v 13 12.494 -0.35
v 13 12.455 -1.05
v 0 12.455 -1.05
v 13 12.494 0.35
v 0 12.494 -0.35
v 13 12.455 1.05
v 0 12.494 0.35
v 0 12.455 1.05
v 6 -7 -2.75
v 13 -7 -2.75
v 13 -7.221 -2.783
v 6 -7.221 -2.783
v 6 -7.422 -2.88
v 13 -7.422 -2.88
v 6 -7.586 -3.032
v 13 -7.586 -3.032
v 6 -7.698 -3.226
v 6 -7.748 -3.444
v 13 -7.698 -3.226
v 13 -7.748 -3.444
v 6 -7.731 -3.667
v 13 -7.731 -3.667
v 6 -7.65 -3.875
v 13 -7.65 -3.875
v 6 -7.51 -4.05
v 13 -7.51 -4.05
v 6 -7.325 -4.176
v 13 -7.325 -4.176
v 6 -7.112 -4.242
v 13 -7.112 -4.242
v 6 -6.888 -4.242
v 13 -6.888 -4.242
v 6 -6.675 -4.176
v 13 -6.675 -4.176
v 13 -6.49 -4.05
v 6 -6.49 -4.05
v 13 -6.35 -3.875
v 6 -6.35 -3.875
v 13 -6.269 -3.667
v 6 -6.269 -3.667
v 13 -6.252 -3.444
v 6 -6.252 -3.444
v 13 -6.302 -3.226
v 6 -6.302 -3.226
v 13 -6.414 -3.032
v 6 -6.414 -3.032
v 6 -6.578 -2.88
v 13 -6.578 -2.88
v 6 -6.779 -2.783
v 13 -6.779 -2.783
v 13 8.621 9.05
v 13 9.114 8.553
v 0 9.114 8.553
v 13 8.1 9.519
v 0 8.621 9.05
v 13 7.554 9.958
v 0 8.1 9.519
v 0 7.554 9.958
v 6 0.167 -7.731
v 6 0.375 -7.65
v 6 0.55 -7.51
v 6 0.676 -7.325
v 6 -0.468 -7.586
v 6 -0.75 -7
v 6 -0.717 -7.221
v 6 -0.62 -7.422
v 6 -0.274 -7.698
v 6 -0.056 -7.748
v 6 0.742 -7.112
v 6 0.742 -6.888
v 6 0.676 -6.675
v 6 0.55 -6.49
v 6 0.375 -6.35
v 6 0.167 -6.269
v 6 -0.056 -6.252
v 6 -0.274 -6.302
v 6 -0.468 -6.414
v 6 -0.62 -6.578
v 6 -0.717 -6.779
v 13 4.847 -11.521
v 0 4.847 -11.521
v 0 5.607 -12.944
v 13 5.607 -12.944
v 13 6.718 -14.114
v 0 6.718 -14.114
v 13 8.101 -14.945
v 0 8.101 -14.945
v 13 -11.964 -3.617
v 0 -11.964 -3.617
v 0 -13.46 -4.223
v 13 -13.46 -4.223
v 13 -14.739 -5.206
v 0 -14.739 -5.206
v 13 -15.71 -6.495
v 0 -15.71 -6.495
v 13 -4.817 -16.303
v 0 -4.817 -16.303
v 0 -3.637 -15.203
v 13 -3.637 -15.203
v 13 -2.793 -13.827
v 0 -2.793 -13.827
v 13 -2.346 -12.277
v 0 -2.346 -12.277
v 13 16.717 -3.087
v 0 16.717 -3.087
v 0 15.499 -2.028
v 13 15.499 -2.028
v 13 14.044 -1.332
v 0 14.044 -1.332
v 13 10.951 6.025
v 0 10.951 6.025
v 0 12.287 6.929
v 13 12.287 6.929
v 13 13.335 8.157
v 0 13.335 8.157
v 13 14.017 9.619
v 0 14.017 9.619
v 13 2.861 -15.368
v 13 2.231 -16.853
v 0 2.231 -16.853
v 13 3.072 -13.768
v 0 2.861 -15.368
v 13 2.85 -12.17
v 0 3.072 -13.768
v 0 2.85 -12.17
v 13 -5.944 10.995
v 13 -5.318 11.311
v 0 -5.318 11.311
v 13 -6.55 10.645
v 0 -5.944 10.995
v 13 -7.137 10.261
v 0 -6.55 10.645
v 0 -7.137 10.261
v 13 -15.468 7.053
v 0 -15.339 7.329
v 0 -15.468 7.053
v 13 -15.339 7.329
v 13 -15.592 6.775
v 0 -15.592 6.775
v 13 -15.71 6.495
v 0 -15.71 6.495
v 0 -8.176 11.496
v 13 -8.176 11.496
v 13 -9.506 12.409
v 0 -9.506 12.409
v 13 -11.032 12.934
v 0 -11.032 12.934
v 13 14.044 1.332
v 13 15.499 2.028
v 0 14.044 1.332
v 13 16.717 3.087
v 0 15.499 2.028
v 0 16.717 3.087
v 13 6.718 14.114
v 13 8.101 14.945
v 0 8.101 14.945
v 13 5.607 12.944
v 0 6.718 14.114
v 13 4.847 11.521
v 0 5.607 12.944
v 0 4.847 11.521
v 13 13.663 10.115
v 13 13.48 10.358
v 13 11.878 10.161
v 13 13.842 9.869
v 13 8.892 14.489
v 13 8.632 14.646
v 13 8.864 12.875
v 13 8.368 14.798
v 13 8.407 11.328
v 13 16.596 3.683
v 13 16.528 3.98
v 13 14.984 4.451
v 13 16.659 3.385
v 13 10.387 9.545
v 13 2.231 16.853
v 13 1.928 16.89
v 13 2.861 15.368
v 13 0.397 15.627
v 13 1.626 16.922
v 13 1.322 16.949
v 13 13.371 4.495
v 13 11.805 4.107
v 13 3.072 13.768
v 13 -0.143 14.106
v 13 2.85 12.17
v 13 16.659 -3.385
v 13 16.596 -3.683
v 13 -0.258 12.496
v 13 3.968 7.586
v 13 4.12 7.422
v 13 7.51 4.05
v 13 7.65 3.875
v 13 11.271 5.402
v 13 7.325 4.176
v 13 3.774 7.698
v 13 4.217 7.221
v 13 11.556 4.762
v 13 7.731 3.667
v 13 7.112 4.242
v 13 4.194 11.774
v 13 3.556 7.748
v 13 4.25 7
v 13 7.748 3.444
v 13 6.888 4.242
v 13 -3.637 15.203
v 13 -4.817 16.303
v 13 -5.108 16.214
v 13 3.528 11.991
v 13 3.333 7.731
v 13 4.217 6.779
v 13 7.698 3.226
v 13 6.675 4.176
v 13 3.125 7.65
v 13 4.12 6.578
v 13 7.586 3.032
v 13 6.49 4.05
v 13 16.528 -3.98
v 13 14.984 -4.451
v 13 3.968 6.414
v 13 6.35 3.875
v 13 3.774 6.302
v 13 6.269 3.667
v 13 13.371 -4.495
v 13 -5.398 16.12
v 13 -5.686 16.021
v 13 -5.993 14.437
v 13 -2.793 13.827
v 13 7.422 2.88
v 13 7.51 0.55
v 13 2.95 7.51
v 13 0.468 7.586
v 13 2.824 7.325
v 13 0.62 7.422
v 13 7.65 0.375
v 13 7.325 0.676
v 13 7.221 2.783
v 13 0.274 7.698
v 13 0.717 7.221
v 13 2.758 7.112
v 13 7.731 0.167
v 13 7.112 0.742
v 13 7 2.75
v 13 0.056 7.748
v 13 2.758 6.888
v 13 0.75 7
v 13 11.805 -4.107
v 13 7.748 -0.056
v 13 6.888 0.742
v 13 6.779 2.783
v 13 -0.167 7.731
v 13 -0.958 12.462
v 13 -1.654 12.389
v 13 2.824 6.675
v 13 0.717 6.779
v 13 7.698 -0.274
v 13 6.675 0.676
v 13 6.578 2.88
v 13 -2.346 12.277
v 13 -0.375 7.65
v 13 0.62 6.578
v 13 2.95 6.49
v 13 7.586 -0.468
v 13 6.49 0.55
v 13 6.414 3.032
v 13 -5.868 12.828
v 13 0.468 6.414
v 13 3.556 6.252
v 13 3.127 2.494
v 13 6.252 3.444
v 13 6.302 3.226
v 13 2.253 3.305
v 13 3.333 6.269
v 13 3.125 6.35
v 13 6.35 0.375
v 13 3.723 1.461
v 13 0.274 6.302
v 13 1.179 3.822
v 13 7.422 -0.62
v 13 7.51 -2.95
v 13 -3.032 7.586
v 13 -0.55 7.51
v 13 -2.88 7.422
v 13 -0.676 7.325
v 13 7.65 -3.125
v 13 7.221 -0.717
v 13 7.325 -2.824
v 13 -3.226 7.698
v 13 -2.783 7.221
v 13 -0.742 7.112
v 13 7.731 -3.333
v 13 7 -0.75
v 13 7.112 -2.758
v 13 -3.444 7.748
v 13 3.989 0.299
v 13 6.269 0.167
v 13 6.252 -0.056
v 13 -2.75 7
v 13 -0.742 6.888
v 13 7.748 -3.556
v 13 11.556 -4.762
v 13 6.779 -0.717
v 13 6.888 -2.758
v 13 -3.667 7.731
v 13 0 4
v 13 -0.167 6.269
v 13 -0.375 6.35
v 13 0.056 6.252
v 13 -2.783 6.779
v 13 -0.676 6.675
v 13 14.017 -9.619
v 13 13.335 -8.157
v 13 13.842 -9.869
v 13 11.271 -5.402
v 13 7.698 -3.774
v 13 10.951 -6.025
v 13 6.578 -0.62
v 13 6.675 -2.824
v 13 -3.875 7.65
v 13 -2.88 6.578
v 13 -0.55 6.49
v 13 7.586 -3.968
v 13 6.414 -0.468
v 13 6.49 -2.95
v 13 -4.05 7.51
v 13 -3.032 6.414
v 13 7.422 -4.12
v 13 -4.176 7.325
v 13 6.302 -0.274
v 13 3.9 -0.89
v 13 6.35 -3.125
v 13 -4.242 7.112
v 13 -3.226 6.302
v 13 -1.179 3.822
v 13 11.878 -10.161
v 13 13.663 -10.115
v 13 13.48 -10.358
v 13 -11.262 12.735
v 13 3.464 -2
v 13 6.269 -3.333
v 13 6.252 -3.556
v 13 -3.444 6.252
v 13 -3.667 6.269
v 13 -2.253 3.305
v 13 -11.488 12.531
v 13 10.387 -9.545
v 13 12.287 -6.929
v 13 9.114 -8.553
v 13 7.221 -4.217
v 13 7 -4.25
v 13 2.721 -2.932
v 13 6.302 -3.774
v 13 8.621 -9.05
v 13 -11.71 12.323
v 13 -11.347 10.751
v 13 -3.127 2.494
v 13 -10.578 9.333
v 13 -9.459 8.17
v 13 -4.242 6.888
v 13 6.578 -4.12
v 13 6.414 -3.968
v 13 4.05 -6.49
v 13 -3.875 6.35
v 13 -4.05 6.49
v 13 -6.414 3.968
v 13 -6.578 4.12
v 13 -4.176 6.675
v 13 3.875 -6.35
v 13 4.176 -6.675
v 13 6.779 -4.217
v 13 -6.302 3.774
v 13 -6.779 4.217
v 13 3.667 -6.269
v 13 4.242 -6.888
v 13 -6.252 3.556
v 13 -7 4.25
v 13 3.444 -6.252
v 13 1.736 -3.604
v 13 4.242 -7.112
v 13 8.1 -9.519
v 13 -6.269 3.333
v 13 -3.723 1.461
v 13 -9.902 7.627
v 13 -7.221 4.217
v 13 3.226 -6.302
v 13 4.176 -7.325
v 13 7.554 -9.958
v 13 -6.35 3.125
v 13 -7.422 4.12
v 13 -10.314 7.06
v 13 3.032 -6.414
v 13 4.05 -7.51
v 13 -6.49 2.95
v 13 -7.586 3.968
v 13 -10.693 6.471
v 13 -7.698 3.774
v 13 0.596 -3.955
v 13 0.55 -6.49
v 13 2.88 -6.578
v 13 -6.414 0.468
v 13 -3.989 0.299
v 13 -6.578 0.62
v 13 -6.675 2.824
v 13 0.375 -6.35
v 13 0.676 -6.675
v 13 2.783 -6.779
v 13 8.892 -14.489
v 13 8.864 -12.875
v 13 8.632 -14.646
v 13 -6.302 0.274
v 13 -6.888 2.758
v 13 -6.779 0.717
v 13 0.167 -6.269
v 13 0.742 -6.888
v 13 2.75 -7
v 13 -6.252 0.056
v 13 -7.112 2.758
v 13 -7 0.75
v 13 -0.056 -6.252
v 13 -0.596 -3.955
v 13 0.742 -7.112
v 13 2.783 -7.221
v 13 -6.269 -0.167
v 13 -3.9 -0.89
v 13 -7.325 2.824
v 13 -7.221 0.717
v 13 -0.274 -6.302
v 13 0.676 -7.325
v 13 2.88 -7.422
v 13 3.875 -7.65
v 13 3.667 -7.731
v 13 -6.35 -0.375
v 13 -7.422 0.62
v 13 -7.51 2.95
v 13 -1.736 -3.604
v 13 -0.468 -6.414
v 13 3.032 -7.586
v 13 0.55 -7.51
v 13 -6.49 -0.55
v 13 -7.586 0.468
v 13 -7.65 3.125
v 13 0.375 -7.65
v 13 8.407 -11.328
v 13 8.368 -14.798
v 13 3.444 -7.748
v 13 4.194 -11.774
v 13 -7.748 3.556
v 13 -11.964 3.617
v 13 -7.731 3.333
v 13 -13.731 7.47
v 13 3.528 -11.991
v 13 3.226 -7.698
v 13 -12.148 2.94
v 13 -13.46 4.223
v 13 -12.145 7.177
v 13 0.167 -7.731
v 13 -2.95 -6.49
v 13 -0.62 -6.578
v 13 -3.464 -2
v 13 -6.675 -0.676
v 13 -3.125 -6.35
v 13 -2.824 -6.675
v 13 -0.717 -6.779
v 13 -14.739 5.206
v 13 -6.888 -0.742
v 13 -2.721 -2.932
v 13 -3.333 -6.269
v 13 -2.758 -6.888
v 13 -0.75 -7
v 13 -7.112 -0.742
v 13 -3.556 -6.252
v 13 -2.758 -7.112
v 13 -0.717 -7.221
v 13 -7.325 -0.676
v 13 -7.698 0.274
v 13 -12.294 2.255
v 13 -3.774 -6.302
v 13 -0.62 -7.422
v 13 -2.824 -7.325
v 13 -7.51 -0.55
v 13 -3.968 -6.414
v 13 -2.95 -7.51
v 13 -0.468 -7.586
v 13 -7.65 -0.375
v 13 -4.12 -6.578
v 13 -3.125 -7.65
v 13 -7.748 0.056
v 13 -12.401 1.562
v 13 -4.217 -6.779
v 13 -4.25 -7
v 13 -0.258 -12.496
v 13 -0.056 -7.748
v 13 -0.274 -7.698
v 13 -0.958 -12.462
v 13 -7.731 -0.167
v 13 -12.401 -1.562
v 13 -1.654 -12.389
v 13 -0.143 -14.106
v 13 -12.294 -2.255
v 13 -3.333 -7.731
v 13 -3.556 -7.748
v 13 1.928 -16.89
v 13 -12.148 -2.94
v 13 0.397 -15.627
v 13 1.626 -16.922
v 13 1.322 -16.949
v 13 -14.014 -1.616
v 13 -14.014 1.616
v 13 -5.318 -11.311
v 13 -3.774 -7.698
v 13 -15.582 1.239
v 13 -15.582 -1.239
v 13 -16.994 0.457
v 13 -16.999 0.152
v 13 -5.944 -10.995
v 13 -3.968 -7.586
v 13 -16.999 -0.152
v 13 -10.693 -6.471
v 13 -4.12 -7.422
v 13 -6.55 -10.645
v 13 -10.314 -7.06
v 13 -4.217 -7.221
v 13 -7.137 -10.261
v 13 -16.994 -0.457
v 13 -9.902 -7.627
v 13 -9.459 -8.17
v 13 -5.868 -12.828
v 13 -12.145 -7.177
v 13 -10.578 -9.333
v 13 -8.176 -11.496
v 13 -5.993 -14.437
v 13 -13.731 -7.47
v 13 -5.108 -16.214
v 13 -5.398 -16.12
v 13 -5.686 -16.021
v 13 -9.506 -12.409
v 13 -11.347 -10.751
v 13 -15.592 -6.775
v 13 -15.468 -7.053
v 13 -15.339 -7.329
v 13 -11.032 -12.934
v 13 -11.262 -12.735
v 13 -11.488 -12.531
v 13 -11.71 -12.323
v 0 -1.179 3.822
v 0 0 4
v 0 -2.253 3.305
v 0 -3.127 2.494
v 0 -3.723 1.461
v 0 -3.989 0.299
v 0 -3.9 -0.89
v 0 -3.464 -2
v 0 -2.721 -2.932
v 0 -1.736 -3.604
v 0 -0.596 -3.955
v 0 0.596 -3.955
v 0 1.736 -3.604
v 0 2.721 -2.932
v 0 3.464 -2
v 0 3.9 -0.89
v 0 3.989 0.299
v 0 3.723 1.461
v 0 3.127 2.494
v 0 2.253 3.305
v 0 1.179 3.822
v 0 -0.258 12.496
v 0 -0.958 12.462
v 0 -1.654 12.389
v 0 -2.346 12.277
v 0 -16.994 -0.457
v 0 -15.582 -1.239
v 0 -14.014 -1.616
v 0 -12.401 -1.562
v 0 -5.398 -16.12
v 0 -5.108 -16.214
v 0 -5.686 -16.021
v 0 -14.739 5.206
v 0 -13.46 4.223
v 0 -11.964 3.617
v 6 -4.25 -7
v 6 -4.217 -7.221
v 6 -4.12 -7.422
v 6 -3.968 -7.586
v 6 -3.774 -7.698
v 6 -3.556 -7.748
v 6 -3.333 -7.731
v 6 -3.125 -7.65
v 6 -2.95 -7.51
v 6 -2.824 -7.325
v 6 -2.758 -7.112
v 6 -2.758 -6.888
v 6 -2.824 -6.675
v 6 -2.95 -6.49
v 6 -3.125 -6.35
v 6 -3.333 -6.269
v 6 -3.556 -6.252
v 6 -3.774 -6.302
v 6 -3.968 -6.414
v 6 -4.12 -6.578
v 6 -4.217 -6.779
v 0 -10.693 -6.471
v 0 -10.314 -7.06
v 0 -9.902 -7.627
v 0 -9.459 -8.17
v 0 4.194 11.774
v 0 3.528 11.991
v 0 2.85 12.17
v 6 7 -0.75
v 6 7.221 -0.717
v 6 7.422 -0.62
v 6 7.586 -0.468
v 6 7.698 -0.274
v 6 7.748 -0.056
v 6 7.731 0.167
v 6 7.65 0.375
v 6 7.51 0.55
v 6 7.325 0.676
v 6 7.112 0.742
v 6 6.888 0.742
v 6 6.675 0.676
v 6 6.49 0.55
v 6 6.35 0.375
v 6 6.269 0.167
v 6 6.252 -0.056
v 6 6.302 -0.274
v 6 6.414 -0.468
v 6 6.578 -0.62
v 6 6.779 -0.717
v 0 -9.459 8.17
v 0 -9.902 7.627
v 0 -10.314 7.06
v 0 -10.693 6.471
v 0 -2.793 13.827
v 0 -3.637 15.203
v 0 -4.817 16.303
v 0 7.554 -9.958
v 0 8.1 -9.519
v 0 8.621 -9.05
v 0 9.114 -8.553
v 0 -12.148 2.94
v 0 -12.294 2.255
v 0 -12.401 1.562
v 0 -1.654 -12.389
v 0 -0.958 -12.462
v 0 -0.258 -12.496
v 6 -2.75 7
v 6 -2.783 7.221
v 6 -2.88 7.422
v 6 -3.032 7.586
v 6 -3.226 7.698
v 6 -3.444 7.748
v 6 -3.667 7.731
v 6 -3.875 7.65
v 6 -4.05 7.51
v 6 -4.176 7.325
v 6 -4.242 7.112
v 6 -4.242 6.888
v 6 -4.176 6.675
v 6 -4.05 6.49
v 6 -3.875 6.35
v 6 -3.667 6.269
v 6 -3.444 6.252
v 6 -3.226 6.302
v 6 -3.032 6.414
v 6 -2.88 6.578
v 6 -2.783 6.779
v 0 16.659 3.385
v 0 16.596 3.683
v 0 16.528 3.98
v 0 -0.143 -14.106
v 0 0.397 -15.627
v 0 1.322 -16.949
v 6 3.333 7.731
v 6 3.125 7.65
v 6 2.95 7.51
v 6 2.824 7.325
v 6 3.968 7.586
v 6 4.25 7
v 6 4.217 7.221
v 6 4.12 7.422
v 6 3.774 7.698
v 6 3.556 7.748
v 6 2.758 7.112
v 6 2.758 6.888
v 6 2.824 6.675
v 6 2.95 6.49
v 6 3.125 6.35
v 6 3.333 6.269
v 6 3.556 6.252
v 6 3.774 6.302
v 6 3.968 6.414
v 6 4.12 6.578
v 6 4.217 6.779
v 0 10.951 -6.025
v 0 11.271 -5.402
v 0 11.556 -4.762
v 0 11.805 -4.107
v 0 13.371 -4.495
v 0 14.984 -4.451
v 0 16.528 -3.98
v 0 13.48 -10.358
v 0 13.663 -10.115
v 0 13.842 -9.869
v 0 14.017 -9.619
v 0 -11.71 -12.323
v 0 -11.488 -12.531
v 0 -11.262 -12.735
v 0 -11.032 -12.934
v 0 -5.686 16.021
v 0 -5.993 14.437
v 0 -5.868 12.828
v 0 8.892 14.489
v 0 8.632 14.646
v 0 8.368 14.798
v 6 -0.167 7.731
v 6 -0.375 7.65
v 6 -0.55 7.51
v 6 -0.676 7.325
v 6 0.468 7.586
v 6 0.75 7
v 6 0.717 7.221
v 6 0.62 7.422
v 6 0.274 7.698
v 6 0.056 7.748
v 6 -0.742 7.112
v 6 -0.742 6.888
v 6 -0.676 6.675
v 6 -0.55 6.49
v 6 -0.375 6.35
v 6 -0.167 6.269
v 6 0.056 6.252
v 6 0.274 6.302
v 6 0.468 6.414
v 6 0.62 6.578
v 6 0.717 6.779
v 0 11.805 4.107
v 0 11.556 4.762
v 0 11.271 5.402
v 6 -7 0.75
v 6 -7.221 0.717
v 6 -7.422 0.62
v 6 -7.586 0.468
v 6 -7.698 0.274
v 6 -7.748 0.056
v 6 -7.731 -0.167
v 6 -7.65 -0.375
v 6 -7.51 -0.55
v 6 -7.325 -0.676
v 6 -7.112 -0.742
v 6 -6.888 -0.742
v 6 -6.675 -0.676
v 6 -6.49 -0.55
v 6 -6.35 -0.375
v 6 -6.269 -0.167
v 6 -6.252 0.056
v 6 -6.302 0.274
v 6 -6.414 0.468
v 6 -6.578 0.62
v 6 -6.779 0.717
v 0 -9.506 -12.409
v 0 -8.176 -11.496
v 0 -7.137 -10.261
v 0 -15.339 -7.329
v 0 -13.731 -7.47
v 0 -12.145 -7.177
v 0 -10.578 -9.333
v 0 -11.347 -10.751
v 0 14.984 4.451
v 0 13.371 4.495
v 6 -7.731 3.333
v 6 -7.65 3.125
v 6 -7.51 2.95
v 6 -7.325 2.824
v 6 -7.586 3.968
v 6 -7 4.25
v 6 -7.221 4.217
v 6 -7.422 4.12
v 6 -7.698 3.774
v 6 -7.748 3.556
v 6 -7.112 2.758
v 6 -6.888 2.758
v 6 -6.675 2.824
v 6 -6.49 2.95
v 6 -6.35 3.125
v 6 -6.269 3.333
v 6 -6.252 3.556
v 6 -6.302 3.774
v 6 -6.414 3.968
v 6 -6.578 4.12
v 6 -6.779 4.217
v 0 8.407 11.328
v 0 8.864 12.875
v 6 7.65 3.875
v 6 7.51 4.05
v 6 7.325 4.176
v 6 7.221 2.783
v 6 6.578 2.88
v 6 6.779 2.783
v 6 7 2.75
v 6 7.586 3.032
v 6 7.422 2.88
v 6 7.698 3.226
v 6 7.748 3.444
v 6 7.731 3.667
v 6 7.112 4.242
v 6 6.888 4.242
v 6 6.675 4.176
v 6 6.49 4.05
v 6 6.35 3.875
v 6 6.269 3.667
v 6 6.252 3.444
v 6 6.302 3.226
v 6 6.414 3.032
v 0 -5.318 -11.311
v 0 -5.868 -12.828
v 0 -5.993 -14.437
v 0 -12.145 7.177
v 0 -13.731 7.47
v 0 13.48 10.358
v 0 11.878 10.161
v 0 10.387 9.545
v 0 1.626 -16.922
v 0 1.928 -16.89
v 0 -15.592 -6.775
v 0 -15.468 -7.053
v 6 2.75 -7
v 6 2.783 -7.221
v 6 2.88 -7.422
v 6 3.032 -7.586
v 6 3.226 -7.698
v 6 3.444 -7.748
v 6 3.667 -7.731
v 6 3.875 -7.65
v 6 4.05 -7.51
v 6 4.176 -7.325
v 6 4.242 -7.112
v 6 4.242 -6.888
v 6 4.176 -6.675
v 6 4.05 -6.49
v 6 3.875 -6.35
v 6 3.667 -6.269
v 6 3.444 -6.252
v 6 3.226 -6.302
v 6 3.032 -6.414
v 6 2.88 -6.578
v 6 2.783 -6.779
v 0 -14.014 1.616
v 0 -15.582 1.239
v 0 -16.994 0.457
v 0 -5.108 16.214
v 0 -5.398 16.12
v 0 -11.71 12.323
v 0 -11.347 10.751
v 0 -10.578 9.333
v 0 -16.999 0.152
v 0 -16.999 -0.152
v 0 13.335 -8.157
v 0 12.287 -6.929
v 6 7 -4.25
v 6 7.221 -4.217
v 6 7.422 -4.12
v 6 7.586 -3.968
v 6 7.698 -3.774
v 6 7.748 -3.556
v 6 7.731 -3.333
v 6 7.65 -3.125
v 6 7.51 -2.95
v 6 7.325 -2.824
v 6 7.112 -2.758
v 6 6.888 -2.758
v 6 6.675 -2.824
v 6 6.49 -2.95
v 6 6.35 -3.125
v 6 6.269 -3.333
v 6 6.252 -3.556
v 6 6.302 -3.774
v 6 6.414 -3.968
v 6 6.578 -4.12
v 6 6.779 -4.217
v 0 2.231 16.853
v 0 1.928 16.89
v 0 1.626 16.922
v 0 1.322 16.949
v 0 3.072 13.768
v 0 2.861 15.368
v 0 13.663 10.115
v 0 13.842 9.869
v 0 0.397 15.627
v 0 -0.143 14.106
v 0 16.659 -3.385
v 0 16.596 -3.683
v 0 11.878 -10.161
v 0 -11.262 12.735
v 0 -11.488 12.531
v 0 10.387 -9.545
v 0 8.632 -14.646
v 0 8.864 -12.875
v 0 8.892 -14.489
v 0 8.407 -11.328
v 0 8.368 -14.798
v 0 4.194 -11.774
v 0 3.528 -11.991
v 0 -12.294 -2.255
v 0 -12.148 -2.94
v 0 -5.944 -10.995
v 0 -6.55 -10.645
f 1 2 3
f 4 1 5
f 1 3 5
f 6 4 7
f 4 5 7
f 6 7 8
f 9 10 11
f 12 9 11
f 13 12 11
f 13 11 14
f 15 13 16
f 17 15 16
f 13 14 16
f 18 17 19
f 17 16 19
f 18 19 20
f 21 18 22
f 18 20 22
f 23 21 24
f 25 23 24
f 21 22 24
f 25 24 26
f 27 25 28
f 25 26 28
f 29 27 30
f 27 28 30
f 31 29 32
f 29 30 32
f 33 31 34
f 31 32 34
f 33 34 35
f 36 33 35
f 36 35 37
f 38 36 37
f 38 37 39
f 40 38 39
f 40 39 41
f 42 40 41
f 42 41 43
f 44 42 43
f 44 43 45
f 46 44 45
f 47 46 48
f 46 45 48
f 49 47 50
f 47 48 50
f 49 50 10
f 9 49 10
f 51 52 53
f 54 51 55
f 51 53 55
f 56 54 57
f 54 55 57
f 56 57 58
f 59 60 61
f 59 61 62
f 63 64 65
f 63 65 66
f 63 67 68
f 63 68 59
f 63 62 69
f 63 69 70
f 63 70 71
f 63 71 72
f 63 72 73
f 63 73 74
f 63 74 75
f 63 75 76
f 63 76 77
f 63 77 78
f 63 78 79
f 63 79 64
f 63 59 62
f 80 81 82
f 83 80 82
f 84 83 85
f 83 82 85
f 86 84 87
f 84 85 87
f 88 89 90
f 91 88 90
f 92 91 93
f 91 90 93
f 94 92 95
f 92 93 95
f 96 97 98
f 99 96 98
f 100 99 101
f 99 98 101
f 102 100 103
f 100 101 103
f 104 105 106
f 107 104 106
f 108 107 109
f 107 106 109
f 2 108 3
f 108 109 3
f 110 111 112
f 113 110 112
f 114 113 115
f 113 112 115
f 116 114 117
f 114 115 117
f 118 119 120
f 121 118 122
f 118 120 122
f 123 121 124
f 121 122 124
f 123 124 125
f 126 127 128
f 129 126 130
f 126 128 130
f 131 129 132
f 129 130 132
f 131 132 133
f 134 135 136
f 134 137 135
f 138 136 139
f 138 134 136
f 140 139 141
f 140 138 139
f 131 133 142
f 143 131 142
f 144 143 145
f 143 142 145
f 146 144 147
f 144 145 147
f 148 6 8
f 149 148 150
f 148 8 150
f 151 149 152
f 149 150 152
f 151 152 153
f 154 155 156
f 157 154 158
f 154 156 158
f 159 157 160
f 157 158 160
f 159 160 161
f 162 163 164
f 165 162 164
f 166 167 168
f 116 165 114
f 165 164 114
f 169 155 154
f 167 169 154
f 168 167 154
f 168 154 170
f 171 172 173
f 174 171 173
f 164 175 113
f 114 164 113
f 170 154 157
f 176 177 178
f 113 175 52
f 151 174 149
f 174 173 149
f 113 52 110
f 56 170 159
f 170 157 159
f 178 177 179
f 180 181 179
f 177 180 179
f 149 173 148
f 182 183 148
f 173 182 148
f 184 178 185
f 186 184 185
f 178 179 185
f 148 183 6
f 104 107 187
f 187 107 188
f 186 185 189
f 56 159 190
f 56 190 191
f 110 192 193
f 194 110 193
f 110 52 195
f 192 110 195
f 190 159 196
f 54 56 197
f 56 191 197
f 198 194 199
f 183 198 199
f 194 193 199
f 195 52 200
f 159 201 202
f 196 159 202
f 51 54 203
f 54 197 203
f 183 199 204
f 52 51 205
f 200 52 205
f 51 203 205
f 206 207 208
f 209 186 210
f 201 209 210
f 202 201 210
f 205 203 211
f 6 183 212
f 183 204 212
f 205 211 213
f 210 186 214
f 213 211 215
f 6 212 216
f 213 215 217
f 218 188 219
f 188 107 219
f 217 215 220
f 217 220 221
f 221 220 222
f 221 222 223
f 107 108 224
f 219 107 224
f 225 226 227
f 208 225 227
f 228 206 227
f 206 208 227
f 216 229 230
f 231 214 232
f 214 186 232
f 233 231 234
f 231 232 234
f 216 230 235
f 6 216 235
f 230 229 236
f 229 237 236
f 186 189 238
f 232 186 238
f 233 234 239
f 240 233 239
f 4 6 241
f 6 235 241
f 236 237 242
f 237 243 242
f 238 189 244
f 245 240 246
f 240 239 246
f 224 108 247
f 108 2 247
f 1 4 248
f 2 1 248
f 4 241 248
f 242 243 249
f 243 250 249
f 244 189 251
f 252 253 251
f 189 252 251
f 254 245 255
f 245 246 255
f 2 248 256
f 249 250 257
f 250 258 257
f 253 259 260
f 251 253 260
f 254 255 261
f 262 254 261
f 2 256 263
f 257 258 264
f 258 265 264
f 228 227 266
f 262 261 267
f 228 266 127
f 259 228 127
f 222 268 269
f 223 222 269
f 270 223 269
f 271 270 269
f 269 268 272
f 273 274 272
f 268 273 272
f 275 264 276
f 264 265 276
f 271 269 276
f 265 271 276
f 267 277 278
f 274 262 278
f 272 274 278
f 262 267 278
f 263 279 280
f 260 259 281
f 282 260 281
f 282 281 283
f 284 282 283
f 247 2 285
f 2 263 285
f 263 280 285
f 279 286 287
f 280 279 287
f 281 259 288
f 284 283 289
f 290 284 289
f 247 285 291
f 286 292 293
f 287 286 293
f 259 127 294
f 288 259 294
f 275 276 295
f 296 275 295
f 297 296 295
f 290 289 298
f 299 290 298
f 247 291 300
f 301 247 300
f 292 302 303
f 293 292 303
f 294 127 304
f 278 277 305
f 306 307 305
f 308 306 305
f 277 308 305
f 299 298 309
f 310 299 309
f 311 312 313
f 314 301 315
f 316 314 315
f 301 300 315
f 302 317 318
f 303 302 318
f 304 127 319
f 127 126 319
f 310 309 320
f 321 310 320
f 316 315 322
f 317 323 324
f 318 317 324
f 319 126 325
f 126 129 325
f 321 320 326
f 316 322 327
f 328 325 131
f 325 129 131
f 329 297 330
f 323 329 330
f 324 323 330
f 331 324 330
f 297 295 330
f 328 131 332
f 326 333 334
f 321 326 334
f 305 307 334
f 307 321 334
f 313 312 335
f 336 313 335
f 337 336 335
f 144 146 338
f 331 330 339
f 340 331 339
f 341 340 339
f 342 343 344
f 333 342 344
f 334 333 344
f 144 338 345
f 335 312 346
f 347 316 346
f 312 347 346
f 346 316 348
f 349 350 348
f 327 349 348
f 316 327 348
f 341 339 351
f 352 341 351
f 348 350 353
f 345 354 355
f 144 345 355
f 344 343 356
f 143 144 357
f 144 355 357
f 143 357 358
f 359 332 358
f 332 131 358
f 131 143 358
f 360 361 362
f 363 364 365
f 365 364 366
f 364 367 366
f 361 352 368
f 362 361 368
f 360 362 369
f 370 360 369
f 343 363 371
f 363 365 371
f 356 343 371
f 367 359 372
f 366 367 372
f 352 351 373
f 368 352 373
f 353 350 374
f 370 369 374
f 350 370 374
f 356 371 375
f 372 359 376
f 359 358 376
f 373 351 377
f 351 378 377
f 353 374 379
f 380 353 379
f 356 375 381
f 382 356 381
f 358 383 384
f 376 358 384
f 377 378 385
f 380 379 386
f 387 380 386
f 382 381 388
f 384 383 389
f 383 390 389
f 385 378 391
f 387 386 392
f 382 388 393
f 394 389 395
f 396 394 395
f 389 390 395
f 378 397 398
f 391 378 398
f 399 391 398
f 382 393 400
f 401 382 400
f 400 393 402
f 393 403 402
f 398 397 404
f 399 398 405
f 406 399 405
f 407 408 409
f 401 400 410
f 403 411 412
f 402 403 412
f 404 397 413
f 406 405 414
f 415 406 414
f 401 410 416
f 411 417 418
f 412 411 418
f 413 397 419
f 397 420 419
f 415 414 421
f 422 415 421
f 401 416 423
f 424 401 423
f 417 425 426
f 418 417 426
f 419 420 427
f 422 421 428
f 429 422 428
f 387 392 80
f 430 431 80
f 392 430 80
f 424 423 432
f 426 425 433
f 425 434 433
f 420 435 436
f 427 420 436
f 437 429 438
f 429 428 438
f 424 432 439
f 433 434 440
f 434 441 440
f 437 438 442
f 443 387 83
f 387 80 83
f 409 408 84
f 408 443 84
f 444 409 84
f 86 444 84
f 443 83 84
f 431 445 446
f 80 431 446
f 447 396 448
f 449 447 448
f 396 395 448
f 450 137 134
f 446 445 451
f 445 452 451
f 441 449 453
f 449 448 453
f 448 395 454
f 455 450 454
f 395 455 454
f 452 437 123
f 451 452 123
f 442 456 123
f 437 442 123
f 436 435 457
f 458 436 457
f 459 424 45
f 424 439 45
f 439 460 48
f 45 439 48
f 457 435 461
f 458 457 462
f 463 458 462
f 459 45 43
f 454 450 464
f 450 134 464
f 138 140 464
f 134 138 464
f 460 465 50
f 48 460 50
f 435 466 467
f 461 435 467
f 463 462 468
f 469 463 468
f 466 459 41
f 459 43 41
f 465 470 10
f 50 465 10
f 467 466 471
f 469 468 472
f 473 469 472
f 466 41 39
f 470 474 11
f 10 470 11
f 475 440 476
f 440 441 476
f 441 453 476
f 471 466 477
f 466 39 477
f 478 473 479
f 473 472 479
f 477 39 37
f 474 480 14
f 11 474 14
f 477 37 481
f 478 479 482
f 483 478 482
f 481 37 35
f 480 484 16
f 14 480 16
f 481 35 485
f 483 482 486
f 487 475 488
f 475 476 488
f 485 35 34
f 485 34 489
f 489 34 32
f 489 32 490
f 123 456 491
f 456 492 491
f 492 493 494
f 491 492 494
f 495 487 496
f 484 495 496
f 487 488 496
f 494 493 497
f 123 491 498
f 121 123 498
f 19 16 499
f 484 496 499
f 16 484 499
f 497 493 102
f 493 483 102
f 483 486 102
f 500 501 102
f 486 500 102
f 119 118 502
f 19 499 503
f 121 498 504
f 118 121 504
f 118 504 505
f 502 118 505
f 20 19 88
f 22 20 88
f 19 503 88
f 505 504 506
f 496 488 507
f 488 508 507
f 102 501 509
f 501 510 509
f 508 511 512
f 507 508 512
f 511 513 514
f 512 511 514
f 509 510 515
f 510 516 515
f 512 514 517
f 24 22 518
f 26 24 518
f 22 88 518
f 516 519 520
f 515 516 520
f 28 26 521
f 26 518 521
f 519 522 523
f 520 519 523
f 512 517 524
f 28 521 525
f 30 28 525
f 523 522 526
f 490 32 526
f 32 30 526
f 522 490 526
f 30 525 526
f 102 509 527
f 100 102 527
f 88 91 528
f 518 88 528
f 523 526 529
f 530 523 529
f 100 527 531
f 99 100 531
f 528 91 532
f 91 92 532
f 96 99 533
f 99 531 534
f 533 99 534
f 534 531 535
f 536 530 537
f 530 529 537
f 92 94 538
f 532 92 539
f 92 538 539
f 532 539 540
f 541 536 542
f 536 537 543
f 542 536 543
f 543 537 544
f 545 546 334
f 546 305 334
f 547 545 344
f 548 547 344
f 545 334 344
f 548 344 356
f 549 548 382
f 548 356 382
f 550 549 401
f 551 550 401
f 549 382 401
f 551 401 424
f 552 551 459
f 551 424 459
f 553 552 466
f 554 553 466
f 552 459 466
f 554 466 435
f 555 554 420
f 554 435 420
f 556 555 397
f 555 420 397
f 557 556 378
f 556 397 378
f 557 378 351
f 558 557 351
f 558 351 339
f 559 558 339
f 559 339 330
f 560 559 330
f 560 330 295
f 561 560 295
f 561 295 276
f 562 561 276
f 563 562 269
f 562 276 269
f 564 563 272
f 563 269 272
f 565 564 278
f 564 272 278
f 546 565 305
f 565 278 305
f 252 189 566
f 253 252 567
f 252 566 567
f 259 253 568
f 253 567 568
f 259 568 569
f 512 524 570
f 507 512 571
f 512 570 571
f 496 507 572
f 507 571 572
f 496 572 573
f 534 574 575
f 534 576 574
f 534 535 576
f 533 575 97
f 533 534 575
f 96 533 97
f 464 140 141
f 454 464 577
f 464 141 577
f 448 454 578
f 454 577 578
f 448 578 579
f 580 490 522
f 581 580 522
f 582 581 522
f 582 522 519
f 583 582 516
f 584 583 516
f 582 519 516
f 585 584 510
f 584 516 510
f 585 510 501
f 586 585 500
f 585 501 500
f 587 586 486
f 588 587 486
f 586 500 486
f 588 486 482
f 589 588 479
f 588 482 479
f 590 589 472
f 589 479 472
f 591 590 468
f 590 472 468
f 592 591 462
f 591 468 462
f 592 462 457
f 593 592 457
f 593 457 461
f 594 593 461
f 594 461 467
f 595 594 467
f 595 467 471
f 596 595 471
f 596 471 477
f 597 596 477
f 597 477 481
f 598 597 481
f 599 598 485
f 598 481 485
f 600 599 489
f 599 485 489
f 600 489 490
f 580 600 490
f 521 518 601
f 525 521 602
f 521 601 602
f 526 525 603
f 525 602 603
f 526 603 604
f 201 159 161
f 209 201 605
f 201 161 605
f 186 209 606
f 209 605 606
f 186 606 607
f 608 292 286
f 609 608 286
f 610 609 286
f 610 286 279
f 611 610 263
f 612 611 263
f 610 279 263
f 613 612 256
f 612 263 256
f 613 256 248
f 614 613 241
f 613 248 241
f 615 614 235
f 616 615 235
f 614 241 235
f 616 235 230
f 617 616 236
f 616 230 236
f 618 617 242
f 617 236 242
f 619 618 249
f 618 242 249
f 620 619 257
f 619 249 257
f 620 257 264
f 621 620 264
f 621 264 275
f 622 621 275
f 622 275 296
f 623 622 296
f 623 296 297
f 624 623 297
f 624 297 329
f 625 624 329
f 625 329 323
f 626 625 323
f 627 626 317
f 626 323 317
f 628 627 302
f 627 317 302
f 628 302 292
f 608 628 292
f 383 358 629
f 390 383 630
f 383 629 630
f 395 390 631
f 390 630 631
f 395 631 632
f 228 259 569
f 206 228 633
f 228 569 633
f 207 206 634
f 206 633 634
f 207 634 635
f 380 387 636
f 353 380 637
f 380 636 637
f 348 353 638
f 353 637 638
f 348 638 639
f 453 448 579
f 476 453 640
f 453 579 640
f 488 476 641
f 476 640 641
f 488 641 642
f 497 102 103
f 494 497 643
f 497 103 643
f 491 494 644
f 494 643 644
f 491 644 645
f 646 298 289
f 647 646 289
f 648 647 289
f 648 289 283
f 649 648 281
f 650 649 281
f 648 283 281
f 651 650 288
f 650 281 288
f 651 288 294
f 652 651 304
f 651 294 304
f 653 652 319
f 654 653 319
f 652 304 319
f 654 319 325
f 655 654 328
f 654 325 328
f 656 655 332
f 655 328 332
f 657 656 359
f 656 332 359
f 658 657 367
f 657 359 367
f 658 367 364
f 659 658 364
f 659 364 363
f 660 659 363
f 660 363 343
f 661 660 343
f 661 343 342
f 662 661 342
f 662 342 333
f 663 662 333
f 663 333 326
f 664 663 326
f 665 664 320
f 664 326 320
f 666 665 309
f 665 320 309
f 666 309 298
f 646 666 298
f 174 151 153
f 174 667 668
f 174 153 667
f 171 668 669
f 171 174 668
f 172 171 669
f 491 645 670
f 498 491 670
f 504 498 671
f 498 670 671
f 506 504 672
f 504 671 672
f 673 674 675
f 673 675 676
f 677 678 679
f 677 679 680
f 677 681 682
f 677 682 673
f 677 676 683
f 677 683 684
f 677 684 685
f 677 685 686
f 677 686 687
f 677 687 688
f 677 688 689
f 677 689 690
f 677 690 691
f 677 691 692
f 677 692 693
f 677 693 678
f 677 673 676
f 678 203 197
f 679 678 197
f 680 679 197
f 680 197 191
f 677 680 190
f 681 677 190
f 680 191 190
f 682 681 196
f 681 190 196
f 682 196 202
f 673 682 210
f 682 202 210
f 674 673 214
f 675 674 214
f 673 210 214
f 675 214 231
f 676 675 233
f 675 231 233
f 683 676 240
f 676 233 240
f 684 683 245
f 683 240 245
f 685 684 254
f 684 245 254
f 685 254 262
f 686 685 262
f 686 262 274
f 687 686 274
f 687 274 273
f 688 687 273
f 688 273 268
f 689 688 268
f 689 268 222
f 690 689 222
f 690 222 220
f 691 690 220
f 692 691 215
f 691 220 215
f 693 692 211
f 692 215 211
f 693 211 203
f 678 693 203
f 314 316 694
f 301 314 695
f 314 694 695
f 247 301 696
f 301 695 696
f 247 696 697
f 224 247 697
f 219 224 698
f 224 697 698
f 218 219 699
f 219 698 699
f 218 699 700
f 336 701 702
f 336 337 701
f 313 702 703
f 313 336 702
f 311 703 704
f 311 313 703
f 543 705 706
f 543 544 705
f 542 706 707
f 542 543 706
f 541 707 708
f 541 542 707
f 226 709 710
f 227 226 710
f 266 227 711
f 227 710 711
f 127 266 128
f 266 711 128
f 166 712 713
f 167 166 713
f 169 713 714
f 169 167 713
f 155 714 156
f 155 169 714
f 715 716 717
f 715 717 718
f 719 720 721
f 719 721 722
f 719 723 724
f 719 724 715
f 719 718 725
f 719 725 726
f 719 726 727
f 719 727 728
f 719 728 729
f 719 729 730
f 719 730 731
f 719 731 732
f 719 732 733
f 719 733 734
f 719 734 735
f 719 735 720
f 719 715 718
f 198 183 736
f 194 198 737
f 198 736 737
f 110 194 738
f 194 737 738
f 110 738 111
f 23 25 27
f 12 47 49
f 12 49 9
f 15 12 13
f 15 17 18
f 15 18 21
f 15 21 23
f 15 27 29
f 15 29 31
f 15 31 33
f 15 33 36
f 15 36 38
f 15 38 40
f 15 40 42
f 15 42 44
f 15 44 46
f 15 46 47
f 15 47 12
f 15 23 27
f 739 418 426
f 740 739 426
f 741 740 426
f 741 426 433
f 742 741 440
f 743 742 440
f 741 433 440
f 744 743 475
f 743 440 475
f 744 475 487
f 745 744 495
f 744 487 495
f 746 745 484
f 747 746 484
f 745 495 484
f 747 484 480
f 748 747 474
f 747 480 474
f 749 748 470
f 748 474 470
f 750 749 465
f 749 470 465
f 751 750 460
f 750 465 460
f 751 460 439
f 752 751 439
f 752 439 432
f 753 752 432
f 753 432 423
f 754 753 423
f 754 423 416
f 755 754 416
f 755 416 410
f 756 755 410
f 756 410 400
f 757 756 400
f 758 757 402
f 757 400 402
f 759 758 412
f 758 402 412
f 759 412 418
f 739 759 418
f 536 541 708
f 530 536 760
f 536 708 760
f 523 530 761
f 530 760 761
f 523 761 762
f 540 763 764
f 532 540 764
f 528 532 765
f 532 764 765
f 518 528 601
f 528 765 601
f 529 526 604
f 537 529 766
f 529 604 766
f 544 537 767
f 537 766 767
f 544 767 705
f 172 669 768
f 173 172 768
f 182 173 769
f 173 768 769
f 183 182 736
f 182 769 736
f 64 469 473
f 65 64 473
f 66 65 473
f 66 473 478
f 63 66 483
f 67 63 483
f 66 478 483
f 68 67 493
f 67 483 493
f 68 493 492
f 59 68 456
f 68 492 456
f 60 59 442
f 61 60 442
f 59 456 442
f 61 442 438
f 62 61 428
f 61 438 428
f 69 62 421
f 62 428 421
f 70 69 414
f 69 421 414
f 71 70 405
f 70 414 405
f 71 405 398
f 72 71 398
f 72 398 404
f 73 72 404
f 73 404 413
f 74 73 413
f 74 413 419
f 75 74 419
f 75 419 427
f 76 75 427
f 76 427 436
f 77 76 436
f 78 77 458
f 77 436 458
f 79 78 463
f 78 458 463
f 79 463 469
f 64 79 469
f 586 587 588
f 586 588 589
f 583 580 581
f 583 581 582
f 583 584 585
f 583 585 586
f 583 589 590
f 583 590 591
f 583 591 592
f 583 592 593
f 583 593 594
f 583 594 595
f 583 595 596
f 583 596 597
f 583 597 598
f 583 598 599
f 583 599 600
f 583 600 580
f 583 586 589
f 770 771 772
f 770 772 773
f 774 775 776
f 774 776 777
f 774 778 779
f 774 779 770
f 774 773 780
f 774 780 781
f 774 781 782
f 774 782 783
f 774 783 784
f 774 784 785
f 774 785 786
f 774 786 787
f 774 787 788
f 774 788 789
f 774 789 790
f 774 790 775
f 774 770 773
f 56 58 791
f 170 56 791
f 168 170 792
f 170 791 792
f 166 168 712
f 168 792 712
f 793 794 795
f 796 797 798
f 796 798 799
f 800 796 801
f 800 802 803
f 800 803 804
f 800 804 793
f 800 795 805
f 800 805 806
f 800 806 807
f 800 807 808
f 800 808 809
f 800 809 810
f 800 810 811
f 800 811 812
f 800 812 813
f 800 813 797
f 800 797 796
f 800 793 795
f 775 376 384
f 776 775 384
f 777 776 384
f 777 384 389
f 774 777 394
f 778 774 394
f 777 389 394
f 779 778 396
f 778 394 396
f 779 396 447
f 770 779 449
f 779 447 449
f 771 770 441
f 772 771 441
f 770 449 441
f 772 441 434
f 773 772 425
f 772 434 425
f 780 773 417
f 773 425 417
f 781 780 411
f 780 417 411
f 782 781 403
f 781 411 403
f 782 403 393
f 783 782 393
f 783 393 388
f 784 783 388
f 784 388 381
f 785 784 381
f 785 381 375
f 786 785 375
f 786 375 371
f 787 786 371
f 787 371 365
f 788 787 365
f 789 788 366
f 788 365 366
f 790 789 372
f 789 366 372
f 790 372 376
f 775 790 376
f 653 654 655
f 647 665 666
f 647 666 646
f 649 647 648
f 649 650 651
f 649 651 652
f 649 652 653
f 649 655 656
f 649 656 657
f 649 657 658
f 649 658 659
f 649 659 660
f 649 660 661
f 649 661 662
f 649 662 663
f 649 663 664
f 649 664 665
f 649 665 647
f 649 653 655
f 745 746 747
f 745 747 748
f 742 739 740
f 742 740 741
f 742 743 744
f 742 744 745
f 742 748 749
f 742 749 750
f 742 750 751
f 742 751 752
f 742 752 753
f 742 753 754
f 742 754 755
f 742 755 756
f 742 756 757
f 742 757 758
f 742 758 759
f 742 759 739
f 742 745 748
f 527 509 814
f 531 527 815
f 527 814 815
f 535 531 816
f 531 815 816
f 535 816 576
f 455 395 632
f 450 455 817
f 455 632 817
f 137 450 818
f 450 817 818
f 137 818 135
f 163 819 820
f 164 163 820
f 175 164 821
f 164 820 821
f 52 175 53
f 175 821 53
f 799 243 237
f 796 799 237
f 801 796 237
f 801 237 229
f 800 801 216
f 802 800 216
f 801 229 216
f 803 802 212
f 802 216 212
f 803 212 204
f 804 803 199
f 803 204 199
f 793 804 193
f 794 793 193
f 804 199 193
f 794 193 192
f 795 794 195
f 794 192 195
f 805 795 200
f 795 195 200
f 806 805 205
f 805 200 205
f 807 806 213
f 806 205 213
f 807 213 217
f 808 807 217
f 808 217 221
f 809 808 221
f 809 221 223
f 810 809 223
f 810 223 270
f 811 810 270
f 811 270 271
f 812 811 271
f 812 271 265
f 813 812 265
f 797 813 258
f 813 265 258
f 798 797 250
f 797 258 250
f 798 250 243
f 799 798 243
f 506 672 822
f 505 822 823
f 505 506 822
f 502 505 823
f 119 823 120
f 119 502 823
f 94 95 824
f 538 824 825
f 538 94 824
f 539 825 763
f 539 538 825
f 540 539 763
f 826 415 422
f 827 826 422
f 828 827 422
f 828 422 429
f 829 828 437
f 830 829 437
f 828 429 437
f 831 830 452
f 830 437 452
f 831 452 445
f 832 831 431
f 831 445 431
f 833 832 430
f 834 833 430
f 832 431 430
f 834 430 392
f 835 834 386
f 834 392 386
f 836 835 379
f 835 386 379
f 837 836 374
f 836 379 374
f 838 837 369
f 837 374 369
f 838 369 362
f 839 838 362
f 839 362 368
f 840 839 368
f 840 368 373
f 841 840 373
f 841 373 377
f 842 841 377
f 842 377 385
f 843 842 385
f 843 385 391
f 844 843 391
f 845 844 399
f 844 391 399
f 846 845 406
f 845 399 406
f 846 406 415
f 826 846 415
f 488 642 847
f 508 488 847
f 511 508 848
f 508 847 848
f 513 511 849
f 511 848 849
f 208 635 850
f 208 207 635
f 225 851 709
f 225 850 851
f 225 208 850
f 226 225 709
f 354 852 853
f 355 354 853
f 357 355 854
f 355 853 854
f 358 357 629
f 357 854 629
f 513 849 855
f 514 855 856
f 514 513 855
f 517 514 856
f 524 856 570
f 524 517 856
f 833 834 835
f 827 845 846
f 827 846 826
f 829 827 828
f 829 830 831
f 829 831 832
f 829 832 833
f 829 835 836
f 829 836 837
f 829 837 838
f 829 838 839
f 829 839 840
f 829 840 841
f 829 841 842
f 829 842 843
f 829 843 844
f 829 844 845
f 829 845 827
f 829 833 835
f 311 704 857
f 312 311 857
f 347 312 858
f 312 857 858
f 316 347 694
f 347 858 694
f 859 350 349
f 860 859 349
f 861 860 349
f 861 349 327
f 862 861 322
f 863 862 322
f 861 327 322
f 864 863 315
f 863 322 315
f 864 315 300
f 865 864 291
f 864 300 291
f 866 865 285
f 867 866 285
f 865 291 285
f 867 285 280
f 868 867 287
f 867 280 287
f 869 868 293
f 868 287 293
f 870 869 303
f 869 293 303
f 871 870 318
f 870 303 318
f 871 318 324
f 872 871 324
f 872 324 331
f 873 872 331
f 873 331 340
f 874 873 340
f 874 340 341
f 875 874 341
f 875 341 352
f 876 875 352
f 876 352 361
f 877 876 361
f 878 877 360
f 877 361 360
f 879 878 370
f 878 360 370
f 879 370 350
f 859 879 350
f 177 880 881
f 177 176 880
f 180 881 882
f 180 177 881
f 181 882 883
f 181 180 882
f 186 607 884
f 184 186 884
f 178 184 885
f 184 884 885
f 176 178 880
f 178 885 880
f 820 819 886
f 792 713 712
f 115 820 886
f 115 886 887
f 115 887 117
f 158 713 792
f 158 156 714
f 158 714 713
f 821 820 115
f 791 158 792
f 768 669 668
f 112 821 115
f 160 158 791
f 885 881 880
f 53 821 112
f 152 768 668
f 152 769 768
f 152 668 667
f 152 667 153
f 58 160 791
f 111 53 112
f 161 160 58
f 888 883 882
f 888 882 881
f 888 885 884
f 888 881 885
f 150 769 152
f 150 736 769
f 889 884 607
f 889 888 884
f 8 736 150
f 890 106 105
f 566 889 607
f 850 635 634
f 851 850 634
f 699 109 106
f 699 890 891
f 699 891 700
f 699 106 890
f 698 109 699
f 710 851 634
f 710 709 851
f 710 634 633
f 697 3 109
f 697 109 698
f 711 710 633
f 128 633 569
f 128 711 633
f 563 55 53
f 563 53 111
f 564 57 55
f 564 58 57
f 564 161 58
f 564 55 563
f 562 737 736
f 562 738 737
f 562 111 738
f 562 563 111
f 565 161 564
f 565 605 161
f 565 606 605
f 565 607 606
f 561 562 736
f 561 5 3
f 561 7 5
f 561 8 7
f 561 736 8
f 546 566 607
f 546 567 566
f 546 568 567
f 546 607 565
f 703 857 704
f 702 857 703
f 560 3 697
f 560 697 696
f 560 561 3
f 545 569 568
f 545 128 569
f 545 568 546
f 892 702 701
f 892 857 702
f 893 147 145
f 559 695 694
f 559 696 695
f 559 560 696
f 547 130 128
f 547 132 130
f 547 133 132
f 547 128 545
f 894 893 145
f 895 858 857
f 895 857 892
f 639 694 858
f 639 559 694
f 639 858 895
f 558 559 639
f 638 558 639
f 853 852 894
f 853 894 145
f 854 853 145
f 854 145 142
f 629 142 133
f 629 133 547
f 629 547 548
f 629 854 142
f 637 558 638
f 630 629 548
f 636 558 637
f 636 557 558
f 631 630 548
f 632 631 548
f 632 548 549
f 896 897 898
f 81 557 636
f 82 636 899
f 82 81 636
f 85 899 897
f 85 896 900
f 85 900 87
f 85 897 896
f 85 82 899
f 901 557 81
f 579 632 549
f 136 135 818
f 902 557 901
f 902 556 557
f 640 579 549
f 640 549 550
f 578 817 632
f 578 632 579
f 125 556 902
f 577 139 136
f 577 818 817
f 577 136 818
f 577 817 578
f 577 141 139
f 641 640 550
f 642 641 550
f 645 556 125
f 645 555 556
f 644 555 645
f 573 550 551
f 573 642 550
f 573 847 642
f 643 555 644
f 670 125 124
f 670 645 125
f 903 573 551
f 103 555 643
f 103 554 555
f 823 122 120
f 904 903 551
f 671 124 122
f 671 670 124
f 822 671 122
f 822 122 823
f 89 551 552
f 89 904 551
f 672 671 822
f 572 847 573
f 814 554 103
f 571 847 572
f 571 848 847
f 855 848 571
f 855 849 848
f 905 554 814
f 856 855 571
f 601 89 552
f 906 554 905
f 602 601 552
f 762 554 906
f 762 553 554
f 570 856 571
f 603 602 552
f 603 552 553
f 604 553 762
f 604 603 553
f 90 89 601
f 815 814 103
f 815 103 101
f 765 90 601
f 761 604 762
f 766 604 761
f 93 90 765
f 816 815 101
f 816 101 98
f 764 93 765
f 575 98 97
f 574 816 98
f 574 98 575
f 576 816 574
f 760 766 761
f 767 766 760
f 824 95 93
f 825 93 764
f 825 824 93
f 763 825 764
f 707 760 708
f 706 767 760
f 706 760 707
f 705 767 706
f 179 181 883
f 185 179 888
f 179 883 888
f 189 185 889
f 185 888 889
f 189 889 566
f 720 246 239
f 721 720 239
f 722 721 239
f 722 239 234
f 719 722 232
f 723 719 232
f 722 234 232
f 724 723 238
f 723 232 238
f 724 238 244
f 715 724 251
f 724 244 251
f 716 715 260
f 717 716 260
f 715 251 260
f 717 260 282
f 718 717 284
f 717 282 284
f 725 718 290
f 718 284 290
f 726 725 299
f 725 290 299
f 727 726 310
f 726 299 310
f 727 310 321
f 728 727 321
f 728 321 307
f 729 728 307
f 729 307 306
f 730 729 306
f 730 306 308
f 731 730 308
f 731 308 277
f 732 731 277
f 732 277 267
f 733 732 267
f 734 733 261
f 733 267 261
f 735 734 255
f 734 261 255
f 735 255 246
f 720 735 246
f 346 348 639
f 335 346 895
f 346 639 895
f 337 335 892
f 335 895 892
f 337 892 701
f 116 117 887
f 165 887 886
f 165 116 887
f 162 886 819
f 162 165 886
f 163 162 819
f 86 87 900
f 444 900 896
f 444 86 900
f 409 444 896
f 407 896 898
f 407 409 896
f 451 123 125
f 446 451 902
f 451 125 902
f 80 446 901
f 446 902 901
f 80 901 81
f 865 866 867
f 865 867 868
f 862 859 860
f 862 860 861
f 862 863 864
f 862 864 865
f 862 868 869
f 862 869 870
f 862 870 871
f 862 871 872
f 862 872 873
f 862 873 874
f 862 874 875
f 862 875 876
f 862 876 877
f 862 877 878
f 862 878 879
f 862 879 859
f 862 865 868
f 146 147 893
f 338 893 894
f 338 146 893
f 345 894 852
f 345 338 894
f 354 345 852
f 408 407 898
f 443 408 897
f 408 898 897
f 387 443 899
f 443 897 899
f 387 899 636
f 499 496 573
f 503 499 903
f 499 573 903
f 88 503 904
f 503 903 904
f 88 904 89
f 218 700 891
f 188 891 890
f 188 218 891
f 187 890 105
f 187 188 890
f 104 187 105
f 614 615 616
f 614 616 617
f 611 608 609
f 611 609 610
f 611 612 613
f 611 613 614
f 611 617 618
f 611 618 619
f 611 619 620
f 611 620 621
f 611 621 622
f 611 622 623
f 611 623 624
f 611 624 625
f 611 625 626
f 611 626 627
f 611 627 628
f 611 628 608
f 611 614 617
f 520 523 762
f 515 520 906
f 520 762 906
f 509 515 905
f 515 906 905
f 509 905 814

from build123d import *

# Parameters (mm, degrees)
BASPROSKE_W        = 13
BASPROSKE_H        = 17
TOOTHCUT_DEPTH     = 28.331300737
TEETHCUTS_COUNT    = 15
TEETHCUTS_ANGLE    = 336
BORSKE_R           = 4
BORE_DEPTH         = 50.0000508
SKETCH1_R          = 0.75
CUT_EXTRUDE1_DEPTH = 7
CIRPATTERN1_COUNT  = 4


with BuildPart() as part:
    # BasProSke → Base-Revolve (revolve)
    with BuildSketch(Plane(origin=(0, 0, 0), x_dir=(1, 0, 0), z_dir=(0, 1, 0)), mode=Mode.PRIVATE) as base_revolve_sk:
        with Locations((6.5, 8.5)):
            Rectangle(BASPROSKE_W, BASPROSKE_H)
    revolve(base_revolve_sk.sketch.rotate(Axis((-10, 0, 0), (1, 0, 0)), 180), axis=Axis((-10, 0, 0), (1, 0, 0)))

    # TooCutSke → ToothCut (cut, through all)
    with BuildSketch(Plane(origin=(0, 0, 0), x_dir=(0, 0, -1), z_dir=(1, 0, 0))):
        with BuildLine():
            ThreePointArc((1.050056448, 12.454813626), (0, 12.499), (-1.050056448, 12.454813626))
            ThreePointArc((-1.050056448, 12.454813626), (-1.638118106, 14.809604533), (-3.110934279, 16.73876737))
            ThreePointArc((-3.110934279, 16.73876737), (0, 17.0254), (3.110934279, 16.73876737))
            ThreePointArc((3.110934279, 16.73876737), (1.638118106, 14.809604533), (1.050056448, 12.454813626))
        make_face()
    toothcut = extrude(amount=TOOTHCUT_DEPTH, mode=Mode.SUBTRACT)

    # TeethCuts: ToothCut ×15 about axis
    teethcuts_axis = Axis((-10, 0, 0), (1, 0, 0))
    for i in range(1, TEETHCUTS_COUNT):
        add(toothcut.rotate(teethcuts_axis, i * TEETHCUTS_ANGLE / (TEETHCUTS_COUNT - 1)), mode=Mode.SUBTRACT)

    # BorSke → Bore (cut, symmetric)
    with BuildSketch(Plane(origin=(0, 0, 0), x_dir=(0, 0, -1), z_dir=(1, 0, 0))):
        with Locations(Location((0, 0, 0), (0, 0, 180))):
            Circle(BORSKE_R)
    extrude(amount=BORE_DEPTH, both=True, mode=Mode.SUBTRACT)

    # Sketch1 → Cut-Extrude1 (cut)
    with BuildSketch(Plane(origin=(13, 0, 0), x_dir=(0, 0, -1), z_dir=(1, 0, 0))):
        with Locations((-3.5, 7)):
            Circle(SKETCH1_R)
        with Locations((0, 7)):
            Circle(SKETCH1_R)
        with Locations((3.5, 7)):
            Circle(SKETCH1_R)
    cut_extrude1 = extrude(amount=-CUT_EXTRUDE1_DEPTH, mode=Mode.SUBTRACT)

    # CirPattern1: Cut-Extrude1 ×4 about axis
    cirpattern1_axis = Axis((0, 0, 0), (1, 0, 0))
    for i in range(1, CIRPATTERN1_COUNT):
        add(cut_extrude1.rotate(cirpattern1_axis, i * 360 / CIRPATTERN1_COUNT), mode=Mode.SUBTRACT)


solid = part.part
